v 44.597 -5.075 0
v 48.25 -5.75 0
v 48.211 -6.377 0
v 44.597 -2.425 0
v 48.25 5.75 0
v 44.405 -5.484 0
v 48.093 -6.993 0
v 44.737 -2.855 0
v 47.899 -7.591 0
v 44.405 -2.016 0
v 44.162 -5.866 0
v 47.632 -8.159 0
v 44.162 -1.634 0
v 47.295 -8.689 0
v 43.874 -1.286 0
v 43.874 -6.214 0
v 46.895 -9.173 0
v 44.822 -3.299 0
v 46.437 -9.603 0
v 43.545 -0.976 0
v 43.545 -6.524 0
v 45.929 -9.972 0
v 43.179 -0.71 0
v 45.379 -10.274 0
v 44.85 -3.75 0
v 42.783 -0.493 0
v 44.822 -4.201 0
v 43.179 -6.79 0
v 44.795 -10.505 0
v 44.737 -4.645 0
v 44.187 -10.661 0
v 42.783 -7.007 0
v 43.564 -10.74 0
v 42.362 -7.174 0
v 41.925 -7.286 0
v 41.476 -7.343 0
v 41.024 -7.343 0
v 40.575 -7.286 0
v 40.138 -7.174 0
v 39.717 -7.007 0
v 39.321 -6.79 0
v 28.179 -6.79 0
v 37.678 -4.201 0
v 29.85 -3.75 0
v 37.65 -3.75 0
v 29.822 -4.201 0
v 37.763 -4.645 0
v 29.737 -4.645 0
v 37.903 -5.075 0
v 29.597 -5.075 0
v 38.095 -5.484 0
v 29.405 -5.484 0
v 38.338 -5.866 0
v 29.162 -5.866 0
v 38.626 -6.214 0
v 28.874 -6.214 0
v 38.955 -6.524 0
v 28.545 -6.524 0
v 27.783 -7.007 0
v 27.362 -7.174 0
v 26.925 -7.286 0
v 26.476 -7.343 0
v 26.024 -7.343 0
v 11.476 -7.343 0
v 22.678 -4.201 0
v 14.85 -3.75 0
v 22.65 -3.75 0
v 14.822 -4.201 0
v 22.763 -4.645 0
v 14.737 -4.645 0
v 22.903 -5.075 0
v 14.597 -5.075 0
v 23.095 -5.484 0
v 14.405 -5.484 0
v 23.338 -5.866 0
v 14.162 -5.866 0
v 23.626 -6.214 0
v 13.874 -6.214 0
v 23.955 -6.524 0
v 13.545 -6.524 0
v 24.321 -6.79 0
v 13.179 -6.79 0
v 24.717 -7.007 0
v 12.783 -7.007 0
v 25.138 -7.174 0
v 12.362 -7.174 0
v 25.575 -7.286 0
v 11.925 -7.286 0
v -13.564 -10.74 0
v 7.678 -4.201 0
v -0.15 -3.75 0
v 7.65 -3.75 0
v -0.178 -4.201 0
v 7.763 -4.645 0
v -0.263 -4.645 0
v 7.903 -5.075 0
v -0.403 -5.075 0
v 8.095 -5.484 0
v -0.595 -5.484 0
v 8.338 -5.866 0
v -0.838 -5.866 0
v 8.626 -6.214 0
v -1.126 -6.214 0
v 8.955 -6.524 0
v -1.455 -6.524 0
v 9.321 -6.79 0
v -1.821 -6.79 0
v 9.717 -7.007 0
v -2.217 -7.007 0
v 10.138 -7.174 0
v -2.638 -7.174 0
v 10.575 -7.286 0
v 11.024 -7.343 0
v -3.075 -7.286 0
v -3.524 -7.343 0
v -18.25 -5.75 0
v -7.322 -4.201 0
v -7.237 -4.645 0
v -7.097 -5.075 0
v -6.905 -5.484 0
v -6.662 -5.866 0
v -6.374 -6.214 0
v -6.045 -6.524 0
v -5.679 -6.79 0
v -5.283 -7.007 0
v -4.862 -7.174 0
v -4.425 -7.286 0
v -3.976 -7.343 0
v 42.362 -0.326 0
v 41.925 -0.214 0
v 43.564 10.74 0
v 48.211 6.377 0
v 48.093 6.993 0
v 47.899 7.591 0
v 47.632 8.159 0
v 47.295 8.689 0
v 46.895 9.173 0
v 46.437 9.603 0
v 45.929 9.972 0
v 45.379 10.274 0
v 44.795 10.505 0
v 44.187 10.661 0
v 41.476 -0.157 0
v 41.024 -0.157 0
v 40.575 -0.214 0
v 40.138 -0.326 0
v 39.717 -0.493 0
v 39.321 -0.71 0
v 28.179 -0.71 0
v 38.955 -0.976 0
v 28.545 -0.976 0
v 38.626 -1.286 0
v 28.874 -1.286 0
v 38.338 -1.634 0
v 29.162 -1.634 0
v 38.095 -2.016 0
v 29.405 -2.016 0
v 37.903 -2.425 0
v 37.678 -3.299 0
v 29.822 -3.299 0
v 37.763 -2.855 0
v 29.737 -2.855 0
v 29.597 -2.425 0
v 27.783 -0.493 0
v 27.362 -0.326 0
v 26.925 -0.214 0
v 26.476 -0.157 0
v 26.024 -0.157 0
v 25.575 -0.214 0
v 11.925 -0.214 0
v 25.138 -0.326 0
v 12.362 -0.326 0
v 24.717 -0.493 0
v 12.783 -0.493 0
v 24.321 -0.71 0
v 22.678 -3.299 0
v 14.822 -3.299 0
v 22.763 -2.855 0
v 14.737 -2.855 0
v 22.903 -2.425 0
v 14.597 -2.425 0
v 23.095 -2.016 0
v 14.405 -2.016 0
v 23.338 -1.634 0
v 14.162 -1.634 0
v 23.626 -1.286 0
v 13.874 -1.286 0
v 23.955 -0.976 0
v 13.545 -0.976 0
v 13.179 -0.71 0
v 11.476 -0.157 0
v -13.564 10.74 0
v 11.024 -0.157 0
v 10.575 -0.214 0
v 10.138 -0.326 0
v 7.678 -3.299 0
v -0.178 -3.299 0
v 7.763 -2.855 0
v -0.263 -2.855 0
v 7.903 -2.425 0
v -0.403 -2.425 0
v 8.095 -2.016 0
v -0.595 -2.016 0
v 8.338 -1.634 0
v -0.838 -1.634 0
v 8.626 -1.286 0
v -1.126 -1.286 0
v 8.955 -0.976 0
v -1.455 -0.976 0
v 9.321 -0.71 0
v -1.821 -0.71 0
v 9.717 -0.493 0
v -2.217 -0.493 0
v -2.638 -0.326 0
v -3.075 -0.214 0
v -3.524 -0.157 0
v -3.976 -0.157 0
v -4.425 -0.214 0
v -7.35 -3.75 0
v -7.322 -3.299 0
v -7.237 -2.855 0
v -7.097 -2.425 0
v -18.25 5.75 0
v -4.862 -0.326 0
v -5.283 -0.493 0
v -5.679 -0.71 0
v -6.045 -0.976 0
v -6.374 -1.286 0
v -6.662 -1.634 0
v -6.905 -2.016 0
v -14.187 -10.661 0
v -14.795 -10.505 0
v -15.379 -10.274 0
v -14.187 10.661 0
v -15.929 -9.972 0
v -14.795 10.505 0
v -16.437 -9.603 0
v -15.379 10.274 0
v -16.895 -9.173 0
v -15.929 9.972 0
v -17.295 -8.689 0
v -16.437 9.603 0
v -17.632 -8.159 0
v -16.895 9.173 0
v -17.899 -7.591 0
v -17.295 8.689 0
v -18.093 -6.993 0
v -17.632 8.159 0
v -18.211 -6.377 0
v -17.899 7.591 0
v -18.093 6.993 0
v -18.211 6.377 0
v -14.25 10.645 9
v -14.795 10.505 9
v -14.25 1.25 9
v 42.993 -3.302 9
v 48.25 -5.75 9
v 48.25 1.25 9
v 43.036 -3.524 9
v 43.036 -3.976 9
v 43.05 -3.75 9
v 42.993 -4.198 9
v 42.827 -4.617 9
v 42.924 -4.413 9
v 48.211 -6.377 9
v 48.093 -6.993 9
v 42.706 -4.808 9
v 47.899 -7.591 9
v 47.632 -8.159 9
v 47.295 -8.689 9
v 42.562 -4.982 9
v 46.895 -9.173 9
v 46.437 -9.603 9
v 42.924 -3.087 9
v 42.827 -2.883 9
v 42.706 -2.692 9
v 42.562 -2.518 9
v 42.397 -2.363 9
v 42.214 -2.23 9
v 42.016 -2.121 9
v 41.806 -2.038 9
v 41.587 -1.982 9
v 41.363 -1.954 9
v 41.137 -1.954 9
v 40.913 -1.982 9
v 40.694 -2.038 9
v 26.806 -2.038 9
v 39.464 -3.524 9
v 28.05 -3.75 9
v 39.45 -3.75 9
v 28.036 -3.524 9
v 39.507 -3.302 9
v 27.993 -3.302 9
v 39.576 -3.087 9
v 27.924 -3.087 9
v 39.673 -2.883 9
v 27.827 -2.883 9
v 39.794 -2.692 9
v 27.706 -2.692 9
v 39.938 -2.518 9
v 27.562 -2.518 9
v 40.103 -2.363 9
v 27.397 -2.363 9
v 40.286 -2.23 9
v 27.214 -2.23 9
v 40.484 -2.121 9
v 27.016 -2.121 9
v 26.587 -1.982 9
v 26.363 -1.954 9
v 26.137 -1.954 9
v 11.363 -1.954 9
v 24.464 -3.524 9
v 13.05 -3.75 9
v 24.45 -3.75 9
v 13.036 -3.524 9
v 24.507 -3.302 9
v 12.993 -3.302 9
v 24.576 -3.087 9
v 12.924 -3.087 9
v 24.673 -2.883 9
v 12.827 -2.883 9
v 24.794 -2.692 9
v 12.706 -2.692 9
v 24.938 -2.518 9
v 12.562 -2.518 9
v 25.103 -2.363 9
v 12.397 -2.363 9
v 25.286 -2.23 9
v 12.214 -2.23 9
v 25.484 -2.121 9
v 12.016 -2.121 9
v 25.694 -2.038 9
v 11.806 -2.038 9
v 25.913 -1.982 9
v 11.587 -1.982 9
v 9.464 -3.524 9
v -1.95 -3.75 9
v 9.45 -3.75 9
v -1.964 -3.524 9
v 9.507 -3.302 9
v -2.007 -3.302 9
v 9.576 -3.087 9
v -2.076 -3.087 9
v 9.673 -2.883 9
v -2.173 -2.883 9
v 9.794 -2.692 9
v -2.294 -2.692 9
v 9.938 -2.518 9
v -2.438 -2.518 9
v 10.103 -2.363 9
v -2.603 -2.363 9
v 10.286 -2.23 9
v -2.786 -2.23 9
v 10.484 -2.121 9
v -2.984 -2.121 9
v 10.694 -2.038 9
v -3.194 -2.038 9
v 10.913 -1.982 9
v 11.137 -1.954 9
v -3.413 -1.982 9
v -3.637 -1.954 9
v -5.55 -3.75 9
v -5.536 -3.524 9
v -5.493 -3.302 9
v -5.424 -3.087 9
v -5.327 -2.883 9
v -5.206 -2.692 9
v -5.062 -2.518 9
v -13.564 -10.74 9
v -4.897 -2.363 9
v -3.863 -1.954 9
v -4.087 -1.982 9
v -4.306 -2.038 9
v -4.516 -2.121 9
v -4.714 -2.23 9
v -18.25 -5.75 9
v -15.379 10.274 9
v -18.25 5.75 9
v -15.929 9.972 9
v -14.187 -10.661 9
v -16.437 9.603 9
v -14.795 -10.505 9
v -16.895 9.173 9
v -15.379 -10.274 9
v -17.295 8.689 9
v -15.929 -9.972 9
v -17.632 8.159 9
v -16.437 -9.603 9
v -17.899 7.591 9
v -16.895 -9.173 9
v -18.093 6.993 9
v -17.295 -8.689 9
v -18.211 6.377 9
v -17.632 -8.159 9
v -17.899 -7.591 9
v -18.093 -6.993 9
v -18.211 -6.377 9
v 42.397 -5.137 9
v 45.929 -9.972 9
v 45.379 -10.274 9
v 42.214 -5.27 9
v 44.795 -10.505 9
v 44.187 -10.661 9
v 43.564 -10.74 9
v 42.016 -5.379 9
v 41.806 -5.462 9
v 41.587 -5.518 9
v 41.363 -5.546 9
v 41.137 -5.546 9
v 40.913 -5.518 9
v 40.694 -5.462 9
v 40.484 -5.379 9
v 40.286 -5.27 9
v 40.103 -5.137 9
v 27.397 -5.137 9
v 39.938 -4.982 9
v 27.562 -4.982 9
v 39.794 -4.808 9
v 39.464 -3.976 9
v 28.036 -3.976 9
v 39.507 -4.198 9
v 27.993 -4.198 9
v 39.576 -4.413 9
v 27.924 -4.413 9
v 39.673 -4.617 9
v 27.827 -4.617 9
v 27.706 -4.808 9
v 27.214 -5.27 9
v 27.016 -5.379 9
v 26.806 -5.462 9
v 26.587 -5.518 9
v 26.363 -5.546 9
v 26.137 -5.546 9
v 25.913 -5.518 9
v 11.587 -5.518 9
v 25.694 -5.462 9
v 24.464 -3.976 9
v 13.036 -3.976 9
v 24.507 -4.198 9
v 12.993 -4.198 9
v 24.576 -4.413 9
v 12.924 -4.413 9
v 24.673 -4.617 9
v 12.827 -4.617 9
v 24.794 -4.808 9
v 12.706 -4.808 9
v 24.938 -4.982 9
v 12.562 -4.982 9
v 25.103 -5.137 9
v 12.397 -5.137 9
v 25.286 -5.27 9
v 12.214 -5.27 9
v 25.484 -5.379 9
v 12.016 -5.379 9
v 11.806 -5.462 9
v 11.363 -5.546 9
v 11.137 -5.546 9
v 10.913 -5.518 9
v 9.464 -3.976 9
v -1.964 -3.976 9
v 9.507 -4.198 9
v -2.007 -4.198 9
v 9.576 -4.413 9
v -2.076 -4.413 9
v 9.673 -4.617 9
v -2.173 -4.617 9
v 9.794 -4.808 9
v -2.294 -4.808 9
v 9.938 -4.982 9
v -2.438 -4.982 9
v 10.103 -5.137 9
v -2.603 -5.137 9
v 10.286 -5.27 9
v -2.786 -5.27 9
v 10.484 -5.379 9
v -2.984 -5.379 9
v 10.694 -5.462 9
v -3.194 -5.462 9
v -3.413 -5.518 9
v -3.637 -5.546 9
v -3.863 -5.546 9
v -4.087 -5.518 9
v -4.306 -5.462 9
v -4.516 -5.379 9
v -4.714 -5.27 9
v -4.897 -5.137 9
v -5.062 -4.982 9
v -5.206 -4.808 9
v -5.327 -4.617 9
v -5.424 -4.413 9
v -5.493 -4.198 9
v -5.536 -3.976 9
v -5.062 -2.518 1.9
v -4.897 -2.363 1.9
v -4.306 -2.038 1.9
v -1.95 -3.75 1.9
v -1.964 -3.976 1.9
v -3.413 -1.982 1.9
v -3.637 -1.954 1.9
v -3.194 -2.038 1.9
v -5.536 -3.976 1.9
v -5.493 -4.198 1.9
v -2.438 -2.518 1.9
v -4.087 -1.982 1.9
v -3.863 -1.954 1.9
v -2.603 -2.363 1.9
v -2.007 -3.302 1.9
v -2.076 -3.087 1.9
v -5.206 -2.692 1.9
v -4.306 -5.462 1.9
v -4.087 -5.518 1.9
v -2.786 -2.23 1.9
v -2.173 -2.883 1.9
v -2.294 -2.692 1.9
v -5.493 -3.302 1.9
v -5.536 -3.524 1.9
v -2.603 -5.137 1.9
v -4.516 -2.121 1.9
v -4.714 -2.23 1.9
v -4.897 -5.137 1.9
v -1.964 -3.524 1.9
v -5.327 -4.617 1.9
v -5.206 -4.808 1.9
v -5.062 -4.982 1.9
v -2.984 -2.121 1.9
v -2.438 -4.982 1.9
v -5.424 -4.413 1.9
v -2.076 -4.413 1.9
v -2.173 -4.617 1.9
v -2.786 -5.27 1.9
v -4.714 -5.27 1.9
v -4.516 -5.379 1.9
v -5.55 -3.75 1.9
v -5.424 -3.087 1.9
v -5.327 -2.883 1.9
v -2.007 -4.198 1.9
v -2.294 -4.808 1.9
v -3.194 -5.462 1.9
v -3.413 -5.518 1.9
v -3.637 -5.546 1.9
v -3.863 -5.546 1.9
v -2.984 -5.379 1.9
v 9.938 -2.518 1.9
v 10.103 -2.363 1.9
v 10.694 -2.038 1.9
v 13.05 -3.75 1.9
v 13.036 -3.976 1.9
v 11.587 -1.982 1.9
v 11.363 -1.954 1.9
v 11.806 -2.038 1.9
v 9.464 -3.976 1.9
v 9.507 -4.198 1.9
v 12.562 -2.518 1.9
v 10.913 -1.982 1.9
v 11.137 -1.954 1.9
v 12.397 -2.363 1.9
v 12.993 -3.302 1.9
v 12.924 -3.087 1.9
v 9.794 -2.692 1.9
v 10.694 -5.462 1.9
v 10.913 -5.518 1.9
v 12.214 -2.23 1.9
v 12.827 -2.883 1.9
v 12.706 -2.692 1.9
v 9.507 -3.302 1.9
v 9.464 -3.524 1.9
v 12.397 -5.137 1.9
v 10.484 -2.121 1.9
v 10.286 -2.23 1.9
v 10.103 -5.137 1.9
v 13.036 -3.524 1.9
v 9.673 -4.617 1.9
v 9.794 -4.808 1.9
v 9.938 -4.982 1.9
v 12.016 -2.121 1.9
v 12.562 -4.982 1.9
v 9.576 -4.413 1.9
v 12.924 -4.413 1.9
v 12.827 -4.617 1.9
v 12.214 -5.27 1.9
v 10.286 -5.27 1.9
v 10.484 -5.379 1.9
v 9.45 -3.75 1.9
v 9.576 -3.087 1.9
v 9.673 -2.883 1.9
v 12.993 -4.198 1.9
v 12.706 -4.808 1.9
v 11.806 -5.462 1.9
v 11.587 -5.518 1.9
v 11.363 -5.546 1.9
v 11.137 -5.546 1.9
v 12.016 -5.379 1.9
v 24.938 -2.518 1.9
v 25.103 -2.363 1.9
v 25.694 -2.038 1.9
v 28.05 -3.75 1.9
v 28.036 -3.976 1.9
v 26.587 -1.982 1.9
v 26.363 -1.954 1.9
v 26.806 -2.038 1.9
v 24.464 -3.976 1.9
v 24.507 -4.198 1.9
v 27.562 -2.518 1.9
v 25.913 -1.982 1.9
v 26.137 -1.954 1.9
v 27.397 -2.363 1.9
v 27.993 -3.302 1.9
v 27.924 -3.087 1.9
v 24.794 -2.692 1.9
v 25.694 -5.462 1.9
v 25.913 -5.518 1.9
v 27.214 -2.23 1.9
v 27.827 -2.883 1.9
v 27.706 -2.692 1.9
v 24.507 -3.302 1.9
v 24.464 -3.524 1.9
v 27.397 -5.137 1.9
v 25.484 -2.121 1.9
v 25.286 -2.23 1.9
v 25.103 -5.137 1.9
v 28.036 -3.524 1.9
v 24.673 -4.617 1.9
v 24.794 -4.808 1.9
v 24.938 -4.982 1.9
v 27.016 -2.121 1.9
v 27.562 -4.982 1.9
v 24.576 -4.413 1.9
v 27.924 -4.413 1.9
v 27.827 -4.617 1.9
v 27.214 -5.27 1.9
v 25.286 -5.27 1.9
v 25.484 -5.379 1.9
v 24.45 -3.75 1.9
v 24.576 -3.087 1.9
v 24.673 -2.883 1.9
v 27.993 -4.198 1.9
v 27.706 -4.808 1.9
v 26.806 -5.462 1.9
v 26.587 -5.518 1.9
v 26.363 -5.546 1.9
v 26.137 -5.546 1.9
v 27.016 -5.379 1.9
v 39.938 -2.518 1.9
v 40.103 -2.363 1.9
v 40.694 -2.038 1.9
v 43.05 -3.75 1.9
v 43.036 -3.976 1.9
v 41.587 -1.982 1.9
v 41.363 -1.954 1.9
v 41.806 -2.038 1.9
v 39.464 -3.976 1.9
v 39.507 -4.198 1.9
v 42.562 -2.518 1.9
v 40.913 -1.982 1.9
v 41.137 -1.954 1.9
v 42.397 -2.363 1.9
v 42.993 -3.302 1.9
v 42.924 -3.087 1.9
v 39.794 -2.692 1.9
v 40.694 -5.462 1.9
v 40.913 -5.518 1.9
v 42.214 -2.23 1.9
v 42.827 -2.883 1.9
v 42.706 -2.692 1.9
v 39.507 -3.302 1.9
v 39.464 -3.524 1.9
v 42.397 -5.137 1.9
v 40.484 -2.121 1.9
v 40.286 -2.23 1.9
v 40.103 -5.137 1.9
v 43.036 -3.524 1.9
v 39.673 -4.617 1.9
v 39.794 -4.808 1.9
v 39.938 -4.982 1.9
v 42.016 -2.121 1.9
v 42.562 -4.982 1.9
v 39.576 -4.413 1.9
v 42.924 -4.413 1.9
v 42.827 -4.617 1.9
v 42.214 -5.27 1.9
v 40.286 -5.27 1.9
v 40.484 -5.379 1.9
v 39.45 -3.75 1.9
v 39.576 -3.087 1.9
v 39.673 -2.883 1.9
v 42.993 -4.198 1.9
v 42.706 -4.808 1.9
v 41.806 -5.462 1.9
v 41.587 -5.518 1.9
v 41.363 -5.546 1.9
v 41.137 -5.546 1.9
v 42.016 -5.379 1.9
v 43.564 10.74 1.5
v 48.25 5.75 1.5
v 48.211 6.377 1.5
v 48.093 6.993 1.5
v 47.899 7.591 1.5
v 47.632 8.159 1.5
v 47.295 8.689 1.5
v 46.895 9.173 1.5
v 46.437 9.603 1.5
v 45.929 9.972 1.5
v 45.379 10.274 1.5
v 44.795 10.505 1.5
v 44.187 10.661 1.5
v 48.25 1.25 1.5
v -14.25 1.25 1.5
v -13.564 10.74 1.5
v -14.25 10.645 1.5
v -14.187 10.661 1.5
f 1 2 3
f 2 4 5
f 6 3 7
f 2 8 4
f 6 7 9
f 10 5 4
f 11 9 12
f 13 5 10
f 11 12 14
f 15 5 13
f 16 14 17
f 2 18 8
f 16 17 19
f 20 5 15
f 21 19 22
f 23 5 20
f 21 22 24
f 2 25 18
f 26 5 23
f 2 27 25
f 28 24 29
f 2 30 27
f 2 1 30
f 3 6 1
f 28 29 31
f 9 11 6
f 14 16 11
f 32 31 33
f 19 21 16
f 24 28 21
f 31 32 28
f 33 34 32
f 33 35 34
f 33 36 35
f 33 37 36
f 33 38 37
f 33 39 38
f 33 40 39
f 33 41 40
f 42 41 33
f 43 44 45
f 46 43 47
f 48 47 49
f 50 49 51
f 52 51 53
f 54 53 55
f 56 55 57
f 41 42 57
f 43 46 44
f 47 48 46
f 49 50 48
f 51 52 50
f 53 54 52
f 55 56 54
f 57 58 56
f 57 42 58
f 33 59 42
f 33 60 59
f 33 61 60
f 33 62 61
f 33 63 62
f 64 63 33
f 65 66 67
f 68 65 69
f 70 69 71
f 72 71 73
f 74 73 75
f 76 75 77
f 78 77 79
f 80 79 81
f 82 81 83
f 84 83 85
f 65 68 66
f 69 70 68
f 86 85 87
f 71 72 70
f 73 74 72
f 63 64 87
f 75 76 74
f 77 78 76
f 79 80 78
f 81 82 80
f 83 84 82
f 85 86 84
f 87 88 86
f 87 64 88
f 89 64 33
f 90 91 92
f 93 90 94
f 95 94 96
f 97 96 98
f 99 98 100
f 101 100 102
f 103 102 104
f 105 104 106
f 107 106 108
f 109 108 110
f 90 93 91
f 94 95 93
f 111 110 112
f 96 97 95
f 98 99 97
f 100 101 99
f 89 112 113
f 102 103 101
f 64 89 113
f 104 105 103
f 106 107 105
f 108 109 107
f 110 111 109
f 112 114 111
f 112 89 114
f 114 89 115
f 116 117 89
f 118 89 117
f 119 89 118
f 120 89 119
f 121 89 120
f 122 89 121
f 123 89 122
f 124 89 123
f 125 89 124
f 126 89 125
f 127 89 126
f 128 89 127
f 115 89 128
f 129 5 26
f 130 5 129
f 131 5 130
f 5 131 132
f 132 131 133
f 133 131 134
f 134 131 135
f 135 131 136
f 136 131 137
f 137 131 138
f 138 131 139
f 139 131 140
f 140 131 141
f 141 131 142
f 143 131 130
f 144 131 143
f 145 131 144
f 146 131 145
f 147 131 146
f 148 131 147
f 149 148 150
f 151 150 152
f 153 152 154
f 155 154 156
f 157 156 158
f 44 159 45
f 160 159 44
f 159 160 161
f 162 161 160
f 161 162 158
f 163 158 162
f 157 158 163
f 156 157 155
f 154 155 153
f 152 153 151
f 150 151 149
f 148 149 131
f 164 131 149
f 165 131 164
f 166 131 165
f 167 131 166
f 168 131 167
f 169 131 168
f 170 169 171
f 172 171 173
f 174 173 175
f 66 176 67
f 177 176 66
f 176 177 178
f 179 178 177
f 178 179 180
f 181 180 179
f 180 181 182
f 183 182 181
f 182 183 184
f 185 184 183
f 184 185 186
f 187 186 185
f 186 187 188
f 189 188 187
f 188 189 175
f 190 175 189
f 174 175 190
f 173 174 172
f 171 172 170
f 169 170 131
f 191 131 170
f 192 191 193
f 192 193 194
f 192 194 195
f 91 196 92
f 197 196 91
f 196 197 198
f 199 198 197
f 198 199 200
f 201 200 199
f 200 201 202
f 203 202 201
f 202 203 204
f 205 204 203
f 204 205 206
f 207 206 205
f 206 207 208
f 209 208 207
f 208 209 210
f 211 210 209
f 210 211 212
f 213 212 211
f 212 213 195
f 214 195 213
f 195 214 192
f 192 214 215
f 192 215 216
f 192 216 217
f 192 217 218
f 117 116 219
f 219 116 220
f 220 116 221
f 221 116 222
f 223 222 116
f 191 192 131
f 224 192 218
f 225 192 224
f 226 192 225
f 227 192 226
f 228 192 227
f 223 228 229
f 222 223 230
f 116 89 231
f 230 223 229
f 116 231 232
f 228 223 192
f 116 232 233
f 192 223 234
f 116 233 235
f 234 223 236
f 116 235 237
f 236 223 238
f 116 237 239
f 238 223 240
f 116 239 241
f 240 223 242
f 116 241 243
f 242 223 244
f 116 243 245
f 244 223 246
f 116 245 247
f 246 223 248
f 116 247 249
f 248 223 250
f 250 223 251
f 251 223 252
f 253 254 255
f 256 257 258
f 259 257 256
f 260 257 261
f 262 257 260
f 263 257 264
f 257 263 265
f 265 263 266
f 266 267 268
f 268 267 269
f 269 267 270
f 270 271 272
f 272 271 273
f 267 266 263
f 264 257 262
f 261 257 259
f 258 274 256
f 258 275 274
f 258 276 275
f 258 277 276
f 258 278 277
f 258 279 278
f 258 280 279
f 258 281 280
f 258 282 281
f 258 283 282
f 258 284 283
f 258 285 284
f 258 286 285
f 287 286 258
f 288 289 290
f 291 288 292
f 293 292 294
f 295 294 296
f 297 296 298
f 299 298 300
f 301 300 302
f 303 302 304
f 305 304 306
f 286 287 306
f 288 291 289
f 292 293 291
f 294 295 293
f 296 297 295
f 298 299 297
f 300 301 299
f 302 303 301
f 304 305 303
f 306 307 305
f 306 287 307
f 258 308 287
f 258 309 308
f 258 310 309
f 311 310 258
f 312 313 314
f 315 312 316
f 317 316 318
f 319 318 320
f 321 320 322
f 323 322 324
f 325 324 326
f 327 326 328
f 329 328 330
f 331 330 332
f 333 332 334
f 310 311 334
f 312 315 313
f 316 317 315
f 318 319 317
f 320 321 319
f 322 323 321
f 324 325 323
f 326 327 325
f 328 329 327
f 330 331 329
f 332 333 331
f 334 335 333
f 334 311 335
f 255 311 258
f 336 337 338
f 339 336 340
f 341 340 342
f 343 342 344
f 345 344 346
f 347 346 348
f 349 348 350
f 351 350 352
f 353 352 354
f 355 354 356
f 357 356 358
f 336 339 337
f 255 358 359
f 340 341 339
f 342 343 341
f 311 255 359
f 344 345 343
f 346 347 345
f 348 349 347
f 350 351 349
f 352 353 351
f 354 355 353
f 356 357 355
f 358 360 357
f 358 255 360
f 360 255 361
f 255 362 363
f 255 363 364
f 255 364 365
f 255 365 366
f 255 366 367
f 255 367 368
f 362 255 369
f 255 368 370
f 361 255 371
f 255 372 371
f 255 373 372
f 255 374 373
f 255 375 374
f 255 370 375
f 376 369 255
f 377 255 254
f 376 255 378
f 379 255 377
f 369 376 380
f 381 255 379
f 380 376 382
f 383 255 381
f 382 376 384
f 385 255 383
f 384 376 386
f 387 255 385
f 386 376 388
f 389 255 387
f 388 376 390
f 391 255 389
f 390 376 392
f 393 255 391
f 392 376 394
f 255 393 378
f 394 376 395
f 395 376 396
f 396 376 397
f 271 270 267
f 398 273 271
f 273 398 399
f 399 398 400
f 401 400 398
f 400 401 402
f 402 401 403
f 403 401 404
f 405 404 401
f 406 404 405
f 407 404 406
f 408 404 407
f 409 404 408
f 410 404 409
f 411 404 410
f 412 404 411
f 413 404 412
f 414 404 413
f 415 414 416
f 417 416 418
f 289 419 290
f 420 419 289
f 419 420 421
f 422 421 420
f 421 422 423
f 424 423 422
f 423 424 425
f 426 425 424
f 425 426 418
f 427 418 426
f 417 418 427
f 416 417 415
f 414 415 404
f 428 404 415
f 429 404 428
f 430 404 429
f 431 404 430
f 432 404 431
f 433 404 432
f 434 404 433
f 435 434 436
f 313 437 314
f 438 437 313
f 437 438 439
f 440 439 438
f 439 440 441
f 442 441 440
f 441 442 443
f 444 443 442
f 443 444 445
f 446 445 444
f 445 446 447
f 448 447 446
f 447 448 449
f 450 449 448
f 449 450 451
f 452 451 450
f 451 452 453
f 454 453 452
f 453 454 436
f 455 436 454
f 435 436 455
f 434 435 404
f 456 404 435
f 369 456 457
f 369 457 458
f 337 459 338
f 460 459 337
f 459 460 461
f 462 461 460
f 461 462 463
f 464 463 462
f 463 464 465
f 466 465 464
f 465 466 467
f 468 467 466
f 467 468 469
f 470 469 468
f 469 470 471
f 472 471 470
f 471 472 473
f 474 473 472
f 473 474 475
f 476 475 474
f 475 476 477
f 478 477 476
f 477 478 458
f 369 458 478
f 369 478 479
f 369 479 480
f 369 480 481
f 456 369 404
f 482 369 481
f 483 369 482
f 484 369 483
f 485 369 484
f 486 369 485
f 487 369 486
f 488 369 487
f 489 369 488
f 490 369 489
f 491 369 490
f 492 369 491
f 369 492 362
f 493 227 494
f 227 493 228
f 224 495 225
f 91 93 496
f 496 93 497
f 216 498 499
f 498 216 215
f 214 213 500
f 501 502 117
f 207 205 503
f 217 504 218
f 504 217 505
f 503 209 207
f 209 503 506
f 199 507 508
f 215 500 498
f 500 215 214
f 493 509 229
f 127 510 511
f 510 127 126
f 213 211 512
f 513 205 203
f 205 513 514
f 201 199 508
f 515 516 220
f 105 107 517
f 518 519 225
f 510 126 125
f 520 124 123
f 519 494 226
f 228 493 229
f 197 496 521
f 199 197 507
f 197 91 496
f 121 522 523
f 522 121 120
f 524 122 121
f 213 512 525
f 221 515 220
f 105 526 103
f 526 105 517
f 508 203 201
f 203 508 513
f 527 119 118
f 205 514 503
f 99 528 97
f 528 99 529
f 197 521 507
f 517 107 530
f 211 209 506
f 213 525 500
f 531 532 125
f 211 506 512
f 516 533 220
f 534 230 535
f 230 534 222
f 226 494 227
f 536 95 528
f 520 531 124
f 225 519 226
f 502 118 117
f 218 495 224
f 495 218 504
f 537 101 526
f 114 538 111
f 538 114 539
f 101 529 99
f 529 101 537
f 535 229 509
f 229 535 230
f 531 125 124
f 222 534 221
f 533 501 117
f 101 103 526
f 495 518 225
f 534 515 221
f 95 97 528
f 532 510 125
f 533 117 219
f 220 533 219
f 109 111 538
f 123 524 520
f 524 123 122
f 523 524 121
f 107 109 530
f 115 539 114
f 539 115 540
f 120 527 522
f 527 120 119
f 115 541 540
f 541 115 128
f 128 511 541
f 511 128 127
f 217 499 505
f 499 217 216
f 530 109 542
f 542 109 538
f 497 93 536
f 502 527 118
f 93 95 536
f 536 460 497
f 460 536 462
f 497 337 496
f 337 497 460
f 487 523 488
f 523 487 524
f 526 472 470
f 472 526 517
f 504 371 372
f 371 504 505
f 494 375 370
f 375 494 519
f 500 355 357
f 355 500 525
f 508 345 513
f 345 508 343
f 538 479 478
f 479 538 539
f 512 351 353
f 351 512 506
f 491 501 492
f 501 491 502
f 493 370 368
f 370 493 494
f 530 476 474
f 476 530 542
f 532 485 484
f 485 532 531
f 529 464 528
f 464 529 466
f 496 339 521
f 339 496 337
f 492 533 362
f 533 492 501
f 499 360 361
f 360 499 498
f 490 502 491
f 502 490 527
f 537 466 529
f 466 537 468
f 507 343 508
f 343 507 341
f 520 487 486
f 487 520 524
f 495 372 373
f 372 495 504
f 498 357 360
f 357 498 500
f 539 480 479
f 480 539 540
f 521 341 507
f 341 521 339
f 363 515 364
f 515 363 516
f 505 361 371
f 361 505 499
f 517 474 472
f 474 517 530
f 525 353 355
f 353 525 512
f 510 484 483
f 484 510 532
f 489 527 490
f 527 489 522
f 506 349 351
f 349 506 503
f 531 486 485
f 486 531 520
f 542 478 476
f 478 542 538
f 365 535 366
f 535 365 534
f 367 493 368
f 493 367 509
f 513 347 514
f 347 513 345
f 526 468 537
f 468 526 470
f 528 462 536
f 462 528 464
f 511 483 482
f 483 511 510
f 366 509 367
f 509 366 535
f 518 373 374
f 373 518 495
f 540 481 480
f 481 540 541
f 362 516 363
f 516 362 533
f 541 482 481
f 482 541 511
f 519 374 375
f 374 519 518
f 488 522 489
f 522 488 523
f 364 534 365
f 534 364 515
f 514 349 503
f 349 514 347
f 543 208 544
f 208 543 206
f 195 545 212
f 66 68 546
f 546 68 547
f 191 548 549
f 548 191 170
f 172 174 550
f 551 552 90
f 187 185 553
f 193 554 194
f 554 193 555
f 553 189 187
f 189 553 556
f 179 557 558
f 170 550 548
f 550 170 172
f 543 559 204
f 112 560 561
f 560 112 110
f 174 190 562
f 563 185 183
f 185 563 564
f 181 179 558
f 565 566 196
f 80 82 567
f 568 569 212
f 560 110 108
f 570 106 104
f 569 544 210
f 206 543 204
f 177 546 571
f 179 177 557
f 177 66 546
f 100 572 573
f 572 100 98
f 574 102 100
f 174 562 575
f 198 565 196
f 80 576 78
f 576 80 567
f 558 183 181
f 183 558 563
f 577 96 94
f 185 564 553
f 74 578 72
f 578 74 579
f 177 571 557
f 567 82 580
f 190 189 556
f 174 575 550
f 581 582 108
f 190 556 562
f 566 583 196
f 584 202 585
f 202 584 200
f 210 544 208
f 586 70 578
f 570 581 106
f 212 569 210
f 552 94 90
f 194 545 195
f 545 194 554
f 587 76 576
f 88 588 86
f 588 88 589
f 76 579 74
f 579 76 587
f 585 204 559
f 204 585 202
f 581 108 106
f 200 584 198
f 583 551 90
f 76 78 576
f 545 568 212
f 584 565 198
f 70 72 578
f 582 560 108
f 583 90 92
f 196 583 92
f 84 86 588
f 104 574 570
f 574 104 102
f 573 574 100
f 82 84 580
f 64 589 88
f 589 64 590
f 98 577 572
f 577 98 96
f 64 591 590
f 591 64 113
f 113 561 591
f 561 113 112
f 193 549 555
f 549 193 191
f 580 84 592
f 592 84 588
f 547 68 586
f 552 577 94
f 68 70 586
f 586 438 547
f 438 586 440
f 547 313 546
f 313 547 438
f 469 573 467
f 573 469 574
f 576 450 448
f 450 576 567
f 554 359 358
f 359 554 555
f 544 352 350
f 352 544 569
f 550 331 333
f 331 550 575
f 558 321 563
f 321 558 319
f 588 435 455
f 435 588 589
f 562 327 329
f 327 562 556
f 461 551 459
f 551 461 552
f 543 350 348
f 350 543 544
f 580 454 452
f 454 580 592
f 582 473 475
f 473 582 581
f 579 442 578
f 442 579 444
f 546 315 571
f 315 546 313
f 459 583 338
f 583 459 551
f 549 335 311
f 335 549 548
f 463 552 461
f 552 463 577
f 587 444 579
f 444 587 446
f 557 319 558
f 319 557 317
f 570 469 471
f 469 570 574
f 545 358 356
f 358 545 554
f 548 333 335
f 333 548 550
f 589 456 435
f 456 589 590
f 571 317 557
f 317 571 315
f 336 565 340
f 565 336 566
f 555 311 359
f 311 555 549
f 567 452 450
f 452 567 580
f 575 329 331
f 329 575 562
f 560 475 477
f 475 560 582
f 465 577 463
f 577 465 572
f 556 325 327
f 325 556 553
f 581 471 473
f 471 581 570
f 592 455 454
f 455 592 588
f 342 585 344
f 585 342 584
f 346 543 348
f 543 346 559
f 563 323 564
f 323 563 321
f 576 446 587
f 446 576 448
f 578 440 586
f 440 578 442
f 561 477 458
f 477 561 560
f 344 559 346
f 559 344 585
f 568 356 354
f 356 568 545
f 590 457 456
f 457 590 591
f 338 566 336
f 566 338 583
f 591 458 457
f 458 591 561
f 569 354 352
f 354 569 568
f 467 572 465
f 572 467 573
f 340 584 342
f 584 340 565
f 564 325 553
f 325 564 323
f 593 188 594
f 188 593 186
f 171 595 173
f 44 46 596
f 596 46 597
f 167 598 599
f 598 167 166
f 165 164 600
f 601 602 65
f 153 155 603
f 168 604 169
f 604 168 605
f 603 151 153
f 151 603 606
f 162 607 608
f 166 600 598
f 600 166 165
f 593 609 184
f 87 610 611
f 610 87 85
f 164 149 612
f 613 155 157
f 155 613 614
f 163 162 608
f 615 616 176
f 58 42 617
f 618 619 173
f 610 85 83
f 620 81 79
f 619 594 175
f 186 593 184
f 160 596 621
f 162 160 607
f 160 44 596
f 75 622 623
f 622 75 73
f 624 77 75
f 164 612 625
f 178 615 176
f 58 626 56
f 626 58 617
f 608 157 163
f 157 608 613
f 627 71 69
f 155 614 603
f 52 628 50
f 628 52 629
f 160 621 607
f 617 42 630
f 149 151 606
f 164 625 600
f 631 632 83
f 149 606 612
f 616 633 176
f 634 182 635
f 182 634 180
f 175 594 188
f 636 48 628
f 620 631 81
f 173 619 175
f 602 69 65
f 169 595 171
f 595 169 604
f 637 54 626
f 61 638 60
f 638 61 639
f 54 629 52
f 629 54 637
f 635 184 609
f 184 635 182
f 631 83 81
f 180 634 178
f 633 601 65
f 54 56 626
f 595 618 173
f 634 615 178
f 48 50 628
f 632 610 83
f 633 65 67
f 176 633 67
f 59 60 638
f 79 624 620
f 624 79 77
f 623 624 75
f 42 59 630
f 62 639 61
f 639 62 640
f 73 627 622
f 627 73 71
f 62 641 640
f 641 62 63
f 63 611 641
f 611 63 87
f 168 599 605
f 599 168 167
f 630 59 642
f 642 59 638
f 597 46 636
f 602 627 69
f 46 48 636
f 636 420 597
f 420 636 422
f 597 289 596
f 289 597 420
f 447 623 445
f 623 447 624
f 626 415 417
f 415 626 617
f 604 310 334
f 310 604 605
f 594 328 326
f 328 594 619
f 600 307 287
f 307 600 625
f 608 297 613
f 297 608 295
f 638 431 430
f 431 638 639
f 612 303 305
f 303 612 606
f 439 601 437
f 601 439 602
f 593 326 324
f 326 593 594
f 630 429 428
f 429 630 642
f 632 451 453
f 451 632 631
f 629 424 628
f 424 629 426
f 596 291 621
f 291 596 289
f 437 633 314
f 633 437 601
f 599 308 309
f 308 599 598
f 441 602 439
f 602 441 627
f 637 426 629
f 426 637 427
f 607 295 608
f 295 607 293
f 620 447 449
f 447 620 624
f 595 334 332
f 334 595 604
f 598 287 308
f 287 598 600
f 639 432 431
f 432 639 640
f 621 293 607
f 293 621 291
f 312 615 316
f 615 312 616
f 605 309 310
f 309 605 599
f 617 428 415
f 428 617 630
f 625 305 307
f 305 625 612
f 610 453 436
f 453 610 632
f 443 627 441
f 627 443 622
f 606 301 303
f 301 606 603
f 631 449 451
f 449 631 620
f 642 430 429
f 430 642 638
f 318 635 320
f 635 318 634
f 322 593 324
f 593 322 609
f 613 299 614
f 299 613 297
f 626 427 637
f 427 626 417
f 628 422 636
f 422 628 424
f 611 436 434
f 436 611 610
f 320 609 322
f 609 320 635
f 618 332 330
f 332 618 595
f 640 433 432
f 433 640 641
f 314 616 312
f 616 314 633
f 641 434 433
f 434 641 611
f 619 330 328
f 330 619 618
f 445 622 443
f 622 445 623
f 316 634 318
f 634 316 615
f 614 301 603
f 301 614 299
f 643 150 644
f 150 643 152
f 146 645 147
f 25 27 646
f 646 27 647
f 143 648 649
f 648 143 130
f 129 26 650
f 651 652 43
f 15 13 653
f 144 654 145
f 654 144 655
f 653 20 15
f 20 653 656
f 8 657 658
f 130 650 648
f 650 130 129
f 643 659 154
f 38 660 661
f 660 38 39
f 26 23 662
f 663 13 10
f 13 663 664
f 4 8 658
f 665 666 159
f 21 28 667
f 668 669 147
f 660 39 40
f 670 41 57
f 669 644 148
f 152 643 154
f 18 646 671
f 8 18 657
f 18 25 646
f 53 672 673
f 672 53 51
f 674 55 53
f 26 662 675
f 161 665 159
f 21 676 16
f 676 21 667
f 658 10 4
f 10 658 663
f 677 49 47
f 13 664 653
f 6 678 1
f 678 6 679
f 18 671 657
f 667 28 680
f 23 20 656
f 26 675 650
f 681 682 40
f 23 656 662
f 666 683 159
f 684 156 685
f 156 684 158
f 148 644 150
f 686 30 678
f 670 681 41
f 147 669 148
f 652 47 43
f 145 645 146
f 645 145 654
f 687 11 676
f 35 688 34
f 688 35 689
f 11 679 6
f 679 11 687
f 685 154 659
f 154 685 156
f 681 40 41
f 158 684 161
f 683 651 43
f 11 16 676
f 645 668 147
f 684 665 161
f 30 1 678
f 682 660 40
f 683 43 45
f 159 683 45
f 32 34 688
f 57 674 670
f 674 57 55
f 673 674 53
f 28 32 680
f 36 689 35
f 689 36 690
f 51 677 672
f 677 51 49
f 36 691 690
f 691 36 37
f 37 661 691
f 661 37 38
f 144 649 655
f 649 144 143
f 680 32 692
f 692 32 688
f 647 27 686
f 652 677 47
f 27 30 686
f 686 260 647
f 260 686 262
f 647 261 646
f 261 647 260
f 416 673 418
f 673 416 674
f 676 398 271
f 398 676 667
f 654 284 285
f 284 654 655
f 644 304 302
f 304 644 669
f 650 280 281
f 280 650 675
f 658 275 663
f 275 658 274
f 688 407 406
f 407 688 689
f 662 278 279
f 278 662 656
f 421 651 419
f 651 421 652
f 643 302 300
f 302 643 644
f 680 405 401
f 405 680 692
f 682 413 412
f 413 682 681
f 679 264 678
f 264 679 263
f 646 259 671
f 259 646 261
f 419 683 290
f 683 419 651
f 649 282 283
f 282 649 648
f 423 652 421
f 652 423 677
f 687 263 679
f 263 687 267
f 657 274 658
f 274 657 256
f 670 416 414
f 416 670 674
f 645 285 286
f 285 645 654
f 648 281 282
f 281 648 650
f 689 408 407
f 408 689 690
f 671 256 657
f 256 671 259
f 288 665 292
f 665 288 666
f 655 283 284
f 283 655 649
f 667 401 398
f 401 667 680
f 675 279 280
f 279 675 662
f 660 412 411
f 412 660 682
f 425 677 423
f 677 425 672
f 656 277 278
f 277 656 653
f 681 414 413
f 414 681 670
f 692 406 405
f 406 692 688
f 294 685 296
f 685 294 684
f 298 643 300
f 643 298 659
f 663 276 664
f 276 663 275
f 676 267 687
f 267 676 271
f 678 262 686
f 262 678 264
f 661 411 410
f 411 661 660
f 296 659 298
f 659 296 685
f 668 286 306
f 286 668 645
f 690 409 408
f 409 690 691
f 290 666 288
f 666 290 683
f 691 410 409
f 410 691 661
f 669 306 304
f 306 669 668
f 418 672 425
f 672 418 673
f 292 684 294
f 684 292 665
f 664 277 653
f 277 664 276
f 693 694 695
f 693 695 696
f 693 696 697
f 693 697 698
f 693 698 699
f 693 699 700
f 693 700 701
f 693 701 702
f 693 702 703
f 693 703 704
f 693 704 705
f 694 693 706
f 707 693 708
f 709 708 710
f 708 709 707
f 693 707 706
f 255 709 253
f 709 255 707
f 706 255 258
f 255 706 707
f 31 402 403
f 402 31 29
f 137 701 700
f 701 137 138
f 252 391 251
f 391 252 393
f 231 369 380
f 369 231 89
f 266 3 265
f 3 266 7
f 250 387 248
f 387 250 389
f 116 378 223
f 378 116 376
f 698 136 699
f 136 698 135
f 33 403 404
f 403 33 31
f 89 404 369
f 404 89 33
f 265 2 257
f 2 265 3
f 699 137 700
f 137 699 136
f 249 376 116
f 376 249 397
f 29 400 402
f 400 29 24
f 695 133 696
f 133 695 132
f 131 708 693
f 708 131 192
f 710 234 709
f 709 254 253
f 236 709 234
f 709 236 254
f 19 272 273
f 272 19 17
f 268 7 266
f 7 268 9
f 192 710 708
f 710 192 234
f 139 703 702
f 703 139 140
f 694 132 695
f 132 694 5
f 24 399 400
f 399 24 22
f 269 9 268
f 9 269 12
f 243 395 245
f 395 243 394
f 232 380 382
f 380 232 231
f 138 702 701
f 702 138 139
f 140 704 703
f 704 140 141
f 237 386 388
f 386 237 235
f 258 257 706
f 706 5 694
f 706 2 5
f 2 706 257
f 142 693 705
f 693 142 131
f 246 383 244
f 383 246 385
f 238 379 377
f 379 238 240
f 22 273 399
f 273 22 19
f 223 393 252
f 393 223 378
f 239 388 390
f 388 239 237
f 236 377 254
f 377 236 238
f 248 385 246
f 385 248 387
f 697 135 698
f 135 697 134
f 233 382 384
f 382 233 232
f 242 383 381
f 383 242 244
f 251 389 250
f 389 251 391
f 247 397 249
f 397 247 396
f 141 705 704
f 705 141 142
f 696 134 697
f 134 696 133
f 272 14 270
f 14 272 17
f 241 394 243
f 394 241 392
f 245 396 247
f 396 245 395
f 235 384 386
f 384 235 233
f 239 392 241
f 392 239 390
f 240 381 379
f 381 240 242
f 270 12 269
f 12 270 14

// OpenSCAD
$fn = 50;


difference() {
	union() {
		translate(v = [15.0000000000, 0, 0]) {
			hull() {
				translate(v = [-28.2500000000, 5.7500000000, 0]) {
					cylinder(h = 9, r = 5);
				}
				translate(v = [28.2500000000, 5.7500000000, 0]) {
					cylinder(h = 9, r = 5);
				}
				translate(v = [-28.2500000000, -5.7500000000, 0]) {
					cylinder(h = 9, r = 5);
				}
				translate(v = [28.2500000000, -5.7500000000, 0]) {
					cylinder(h = 9, r = 5);
				}
			}
		}
	}
	union() {
		translate(v = [-3.7500000000, -3.7500000000, 0]) {
			rotate(a = [180, 0, 0]) {
				difference() {
					union() {
						#translate(v = [0, 0, -9.0000000000]) {
							cylinder(h = 9, r = 1.5000000000);
						}
						#translate(v = [0, 0, -1.9000000000]) {
							cylinder(h = 1.9000000000, r1 = 1.8000000000, r2 = 3.6000000000);
						}
						#translate(v = [0, 0, -9.0000000000]) {
							cylinder(h = 9, r = 1.8000000000);
						}
						#translate(v = [0, 0, -9.0000000000]) {
							cylinder(h = 9, r = 1.5000000000);
						}
					}
					union();
				}
			}
		}
		translate(v = [11.2500000000, -3.7500000000, 0]) {
			rotate(a = [180, 0, 0]) {
				difference() {
					union() {
						#translate(v = [0, 0, -9.0000000000]) {
							cylinder(h = 9, r = 1.5000000000);
						}
						#translate(v = [0, 0, -1.9000000000]) {
							cylinder(h = 1.9000000000, r1 = 1.8000000000, r2 = 3.6000000000);
						}
						#translate(v = [0, 0, -9.0000000000]) {
							cylinder(h = 9, r = 1.8000000000);
						}
						#translate(v = [0, 0, -9.0000000000]) {
							cylinder(h = 9, r = 1.5000000000);
						}
					}
					union();
				}
			}
		}
		translate(v = [26.2500000000, -3.7500000000, 0]) {
			rotate(a = [180, 0, 0]) {
				difference() {
					union() {
						#translate(v = [0, 0, -9.0000000000]) {
							cylinder(h = 9, r = 1.5000000000);
						}
						#translate(v = [0, 0, -1.9000000000]) {
							cylinder(h = 1.9000000000, r1 = 1.8000000000, r2 = 3.6000000000);
						}
						#translate(v = [0, 0, -9.0000000000]) {
							cylinder(h = 9, r = 1.8000000000);
						}
						#translate(v = [0, 0, -9.0000000000]) {
							cylinder(h = 9, r = 1.5000000000);
						}
					}
					union();
				}
			}
		}
		translate(v = [41.2500000000, -3.7500000000, 0]) {
			rotate(a = [180, 0, 0]) {
				difference() {
					union() {
						#translate(v = [0, 0, -9.0000000000]) {
							cylinder(h = 9, r = 1.5000000000);
						}
						#translate(v = [0, 0, -1.9000000000]) {
							cylinder(h = 1.9000000000, r1 = 1.8000000000, r2 = 3.6000000000);
						}
						#translate(v = [0, 0, -9.0000000000]) {
							cylinder(h = 9, r = 1.8000000000);
						}
						#translate(v = [0, 0, -9.0000000000]) {
							cylinder(h = 9, r = 1.5000000000);
						}
					}
					union();
				}
			}
		}
		#translate(v = [-14.2500000000, 1.2500000000, 1.5000000000]) {
			cube(size = [156, 100, 7.5000000000]);
		}
	}
}
